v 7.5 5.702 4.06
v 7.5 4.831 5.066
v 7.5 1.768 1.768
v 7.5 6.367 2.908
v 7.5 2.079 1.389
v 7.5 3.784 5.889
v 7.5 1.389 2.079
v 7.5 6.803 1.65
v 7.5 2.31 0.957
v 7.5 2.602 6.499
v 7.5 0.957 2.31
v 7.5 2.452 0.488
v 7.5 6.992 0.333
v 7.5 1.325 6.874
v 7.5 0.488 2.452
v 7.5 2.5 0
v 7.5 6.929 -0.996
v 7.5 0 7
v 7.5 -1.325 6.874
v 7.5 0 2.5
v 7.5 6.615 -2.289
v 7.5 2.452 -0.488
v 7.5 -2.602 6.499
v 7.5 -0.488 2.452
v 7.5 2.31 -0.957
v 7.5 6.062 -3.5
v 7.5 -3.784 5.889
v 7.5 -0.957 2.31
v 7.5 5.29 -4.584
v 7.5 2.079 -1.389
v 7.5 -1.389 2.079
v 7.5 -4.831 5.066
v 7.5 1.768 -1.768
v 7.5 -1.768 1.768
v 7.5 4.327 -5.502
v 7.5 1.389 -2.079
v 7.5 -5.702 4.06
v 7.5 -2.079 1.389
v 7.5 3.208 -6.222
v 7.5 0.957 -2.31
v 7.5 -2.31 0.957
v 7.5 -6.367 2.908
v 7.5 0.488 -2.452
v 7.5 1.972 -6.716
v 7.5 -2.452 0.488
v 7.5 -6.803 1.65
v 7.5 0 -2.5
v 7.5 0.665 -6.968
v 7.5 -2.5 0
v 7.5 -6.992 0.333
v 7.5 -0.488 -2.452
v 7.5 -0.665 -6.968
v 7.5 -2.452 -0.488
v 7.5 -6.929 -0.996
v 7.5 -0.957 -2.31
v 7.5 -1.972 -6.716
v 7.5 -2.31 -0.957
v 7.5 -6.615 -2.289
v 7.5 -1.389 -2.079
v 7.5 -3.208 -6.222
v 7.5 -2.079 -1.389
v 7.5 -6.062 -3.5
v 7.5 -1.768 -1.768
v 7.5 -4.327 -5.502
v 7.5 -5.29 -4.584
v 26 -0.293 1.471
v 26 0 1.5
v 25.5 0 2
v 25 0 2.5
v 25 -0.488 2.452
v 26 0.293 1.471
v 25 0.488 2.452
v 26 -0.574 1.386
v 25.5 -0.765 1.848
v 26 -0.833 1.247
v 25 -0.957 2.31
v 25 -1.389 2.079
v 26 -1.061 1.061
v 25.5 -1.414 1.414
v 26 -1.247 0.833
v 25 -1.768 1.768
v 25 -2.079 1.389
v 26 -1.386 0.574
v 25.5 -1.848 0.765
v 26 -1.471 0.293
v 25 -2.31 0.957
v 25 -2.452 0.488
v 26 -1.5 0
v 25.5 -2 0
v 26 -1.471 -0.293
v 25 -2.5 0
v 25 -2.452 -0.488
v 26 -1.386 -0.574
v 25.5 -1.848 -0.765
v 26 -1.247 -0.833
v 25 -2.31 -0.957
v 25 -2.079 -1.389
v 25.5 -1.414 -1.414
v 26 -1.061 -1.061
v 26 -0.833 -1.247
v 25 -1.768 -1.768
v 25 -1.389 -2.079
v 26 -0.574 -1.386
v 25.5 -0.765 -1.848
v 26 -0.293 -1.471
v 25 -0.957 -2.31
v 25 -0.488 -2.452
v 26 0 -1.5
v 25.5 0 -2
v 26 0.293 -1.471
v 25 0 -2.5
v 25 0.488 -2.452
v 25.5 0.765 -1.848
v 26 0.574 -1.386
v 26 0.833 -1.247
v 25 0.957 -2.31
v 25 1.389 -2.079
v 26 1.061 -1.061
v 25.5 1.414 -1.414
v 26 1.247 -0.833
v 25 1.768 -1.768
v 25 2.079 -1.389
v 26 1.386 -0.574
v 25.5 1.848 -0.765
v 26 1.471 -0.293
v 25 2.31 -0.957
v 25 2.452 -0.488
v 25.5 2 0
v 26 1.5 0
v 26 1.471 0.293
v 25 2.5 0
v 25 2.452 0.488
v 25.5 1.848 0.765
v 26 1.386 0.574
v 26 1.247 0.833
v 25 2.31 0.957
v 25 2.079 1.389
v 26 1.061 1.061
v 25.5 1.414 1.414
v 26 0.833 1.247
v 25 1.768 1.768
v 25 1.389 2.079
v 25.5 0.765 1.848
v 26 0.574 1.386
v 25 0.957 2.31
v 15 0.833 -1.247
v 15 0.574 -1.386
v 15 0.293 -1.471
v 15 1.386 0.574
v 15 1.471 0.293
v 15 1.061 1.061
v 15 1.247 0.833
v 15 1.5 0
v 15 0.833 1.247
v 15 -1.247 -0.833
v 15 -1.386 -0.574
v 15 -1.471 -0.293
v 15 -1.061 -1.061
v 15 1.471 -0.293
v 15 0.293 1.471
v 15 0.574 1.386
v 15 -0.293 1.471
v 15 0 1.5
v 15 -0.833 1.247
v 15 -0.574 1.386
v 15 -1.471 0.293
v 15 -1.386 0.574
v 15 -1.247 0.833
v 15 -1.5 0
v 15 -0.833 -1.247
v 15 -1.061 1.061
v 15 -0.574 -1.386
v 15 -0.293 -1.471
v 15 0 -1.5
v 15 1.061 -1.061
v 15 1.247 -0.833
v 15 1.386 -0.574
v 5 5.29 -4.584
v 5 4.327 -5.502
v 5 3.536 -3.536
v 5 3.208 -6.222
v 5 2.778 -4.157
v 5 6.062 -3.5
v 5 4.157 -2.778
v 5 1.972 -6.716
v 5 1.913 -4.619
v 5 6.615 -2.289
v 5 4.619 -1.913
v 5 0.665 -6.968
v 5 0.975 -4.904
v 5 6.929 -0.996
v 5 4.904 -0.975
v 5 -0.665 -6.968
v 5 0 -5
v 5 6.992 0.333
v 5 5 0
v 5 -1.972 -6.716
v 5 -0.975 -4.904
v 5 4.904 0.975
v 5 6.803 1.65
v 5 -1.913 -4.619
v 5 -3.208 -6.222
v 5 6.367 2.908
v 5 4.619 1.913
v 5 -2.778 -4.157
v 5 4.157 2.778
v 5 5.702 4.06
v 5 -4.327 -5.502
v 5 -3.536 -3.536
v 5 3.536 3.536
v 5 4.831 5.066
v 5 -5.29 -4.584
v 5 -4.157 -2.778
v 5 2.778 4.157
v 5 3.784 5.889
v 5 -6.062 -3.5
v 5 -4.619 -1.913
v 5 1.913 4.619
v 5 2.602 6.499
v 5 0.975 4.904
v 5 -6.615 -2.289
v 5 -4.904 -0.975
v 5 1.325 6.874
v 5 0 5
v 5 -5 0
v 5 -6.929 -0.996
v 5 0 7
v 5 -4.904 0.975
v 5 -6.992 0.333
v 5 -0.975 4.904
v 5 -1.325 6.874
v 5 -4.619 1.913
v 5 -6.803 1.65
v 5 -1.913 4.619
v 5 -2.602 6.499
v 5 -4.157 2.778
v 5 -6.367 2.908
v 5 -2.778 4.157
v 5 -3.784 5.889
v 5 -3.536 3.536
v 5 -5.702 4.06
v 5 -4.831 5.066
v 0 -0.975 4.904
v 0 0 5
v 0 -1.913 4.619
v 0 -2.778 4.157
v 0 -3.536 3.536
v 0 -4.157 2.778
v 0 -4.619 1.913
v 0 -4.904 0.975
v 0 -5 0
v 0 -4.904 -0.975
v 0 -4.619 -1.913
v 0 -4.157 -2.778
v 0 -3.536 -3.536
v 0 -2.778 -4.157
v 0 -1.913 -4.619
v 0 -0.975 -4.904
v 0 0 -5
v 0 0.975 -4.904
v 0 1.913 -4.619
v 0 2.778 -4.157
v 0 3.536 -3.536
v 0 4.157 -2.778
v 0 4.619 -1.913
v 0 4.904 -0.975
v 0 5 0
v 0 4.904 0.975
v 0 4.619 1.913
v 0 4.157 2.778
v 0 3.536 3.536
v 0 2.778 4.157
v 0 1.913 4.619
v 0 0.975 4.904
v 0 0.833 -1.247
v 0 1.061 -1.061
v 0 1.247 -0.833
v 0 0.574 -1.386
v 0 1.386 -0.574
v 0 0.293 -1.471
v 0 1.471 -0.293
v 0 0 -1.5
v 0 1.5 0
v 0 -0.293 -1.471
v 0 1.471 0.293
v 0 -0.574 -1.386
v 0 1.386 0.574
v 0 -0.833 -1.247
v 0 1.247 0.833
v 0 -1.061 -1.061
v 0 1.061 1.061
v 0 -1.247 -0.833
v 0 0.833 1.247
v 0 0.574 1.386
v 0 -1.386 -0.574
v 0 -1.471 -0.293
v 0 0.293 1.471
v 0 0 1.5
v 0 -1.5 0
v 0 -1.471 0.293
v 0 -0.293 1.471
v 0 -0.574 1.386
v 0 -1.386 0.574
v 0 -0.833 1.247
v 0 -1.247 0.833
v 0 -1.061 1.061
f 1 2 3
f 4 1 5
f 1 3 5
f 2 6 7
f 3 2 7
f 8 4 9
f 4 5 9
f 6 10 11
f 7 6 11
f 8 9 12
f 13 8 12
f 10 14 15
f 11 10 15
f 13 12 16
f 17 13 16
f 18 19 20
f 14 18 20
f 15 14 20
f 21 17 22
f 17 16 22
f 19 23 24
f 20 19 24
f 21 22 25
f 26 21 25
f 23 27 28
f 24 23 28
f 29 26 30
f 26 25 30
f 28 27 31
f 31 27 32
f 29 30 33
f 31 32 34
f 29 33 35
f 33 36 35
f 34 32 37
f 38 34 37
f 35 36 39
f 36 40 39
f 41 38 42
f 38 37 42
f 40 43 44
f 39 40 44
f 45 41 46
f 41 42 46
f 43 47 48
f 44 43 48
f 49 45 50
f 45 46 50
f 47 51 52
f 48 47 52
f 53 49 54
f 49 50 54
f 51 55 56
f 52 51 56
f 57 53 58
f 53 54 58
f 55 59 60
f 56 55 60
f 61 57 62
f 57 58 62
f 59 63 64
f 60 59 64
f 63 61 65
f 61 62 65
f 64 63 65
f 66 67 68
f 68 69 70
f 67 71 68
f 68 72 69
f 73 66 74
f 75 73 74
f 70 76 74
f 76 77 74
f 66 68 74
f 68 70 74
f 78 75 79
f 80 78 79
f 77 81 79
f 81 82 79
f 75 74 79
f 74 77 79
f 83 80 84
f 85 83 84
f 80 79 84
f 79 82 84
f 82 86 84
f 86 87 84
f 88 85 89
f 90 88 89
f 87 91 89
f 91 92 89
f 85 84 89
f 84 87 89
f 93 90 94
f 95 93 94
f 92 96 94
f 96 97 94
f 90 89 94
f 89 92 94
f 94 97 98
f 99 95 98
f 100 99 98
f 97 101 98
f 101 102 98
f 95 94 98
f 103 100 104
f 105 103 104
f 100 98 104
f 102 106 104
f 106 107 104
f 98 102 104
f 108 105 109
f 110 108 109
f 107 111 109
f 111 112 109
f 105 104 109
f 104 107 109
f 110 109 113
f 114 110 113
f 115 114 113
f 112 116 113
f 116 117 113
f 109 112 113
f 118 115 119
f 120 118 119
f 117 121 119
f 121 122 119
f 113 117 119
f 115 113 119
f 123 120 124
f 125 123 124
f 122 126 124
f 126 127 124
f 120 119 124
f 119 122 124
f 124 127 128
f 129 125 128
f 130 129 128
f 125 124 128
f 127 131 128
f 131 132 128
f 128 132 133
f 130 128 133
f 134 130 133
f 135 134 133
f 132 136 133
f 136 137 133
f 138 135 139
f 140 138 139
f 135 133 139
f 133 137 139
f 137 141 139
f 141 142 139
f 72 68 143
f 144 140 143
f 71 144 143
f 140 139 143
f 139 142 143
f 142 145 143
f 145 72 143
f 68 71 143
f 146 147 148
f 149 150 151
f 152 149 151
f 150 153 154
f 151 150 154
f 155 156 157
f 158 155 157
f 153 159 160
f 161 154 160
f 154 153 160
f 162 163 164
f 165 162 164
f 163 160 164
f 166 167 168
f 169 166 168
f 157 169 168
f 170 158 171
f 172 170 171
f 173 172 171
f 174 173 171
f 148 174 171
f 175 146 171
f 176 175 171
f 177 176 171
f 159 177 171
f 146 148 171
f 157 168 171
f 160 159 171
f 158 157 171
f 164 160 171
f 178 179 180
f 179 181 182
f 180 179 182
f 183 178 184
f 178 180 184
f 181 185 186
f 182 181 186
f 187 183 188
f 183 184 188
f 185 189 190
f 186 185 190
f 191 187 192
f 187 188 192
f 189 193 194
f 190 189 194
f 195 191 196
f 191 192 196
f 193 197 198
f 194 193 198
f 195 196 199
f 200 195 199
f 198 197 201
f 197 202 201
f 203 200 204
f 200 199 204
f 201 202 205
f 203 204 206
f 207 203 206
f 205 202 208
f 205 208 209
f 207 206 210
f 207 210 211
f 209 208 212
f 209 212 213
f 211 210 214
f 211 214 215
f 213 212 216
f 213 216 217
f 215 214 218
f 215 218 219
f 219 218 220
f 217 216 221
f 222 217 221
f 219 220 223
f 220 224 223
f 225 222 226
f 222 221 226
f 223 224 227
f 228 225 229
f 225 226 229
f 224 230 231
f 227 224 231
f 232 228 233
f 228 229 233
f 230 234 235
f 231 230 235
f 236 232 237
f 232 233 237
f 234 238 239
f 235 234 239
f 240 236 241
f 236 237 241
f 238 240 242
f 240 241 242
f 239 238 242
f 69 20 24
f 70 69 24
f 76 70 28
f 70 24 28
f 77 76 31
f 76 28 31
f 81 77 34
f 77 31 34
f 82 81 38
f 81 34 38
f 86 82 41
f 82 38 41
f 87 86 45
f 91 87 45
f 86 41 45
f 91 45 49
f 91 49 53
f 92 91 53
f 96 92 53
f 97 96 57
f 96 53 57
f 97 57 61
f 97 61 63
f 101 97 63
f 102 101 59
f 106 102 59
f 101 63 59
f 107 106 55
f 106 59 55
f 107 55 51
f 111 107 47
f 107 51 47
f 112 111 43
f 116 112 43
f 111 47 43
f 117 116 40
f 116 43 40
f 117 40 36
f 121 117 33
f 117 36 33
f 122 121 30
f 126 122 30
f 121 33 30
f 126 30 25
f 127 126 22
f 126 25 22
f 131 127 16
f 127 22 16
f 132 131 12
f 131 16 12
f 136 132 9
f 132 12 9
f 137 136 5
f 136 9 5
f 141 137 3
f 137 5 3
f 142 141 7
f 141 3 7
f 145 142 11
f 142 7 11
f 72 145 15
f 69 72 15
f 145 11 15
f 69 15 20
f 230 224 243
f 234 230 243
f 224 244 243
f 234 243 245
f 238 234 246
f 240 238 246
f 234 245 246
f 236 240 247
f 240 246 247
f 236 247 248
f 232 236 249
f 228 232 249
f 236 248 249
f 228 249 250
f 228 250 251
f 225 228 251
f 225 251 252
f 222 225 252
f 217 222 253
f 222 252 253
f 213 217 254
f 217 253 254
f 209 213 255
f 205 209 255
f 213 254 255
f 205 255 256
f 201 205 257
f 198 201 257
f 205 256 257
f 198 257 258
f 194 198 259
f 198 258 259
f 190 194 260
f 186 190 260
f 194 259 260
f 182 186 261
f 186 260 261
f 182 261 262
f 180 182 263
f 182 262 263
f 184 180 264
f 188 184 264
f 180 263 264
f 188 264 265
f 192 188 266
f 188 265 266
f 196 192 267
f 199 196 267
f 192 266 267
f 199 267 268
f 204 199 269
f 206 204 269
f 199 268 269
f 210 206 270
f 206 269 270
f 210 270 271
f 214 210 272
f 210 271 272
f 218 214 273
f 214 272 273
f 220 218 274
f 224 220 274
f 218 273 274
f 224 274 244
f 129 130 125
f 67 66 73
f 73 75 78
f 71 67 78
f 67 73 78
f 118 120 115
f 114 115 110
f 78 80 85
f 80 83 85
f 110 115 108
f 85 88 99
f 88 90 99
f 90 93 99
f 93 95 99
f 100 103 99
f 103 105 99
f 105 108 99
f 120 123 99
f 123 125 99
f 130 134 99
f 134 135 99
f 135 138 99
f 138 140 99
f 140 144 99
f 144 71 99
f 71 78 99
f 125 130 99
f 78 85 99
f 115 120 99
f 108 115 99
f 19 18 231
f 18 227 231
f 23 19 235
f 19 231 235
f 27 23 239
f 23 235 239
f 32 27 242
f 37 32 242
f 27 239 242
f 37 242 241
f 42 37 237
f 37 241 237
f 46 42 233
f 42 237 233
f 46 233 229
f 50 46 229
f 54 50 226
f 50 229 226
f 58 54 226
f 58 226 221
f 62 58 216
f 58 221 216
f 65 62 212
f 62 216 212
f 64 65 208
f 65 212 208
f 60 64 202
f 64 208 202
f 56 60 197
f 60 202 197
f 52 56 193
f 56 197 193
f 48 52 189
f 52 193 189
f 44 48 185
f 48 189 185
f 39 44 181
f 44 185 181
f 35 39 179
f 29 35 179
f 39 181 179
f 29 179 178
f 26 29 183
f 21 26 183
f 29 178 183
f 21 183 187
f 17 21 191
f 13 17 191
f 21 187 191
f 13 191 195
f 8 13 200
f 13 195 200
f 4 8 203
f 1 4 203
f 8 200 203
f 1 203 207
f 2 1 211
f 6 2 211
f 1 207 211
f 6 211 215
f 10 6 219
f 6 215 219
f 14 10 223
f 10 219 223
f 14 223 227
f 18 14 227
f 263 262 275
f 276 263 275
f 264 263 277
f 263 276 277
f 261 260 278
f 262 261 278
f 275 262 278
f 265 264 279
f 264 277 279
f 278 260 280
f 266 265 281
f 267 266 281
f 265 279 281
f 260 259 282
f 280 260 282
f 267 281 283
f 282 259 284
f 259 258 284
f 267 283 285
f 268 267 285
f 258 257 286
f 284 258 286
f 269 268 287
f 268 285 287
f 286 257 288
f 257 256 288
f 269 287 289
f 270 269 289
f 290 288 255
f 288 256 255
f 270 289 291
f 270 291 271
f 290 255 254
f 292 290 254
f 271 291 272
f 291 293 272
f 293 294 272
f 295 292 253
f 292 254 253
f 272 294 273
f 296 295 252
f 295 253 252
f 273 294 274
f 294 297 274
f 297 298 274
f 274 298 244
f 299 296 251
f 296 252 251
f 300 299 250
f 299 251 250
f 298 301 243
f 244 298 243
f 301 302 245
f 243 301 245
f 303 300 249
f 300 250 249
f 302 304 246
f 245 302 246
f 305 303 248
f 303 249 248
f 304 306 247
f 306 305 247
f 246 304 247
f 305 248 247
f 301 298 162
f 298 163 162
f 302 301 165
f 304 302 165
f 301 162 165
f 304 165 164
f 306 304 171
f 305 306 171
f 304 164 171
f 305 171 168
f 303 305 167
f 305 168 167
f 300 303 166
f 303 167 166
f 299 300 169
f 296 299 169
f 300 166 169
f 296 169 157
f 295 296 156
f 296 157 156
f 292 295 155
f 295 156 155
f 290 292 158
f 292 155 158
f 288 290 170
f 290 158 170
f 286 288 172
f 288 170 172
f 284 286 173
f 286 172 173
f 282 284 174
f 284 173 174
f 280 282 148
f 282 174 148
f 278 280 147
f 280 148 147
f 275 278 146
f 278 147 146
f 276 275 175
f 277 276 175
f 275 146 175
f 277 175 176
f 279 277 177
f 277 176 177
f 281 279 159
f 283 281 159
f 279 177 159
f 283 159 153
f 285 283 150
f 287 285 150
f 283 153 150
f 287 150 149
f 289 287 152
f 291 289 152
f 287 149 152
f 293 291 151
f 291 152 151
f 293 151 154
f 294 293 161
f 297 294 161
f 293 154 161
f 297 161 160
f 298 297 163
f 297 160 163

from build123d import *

# Parameters (mm, degrees)
CHANFREIN1_SIZE = 1


with BuildPart() as part:
    # Esquisse1 → Révolution1 (revolve)
    with BuildSketch(Plane.XY, mode=Mode.PRIVATE) as r_volution1_sk:
        Polygon((0, 1.5), (15, 1.5), (15, 0), (26, 0), (26, 2.5), (7.5, 2.5), (7.5, 7), (5, 7), (5, 5), (0, 5), align=None)
    revolve(r_volution1_sk.sketch.rotate(Axis((-19.163170338, 0, 0), (1, 0, 0)), 90), axis=Axis((-19.163170338, 0, 0), (1, 0, 0)))

    # Chanfrein1
    chanfrein1_edges = [part.edges().sort_by_distance(p)[0] for p in [
        (26, 0, -2.5),
    ]]
    chamfer(chanfrein1_edges, length=CHANFREIN1_SIZE)


solid = part.part
